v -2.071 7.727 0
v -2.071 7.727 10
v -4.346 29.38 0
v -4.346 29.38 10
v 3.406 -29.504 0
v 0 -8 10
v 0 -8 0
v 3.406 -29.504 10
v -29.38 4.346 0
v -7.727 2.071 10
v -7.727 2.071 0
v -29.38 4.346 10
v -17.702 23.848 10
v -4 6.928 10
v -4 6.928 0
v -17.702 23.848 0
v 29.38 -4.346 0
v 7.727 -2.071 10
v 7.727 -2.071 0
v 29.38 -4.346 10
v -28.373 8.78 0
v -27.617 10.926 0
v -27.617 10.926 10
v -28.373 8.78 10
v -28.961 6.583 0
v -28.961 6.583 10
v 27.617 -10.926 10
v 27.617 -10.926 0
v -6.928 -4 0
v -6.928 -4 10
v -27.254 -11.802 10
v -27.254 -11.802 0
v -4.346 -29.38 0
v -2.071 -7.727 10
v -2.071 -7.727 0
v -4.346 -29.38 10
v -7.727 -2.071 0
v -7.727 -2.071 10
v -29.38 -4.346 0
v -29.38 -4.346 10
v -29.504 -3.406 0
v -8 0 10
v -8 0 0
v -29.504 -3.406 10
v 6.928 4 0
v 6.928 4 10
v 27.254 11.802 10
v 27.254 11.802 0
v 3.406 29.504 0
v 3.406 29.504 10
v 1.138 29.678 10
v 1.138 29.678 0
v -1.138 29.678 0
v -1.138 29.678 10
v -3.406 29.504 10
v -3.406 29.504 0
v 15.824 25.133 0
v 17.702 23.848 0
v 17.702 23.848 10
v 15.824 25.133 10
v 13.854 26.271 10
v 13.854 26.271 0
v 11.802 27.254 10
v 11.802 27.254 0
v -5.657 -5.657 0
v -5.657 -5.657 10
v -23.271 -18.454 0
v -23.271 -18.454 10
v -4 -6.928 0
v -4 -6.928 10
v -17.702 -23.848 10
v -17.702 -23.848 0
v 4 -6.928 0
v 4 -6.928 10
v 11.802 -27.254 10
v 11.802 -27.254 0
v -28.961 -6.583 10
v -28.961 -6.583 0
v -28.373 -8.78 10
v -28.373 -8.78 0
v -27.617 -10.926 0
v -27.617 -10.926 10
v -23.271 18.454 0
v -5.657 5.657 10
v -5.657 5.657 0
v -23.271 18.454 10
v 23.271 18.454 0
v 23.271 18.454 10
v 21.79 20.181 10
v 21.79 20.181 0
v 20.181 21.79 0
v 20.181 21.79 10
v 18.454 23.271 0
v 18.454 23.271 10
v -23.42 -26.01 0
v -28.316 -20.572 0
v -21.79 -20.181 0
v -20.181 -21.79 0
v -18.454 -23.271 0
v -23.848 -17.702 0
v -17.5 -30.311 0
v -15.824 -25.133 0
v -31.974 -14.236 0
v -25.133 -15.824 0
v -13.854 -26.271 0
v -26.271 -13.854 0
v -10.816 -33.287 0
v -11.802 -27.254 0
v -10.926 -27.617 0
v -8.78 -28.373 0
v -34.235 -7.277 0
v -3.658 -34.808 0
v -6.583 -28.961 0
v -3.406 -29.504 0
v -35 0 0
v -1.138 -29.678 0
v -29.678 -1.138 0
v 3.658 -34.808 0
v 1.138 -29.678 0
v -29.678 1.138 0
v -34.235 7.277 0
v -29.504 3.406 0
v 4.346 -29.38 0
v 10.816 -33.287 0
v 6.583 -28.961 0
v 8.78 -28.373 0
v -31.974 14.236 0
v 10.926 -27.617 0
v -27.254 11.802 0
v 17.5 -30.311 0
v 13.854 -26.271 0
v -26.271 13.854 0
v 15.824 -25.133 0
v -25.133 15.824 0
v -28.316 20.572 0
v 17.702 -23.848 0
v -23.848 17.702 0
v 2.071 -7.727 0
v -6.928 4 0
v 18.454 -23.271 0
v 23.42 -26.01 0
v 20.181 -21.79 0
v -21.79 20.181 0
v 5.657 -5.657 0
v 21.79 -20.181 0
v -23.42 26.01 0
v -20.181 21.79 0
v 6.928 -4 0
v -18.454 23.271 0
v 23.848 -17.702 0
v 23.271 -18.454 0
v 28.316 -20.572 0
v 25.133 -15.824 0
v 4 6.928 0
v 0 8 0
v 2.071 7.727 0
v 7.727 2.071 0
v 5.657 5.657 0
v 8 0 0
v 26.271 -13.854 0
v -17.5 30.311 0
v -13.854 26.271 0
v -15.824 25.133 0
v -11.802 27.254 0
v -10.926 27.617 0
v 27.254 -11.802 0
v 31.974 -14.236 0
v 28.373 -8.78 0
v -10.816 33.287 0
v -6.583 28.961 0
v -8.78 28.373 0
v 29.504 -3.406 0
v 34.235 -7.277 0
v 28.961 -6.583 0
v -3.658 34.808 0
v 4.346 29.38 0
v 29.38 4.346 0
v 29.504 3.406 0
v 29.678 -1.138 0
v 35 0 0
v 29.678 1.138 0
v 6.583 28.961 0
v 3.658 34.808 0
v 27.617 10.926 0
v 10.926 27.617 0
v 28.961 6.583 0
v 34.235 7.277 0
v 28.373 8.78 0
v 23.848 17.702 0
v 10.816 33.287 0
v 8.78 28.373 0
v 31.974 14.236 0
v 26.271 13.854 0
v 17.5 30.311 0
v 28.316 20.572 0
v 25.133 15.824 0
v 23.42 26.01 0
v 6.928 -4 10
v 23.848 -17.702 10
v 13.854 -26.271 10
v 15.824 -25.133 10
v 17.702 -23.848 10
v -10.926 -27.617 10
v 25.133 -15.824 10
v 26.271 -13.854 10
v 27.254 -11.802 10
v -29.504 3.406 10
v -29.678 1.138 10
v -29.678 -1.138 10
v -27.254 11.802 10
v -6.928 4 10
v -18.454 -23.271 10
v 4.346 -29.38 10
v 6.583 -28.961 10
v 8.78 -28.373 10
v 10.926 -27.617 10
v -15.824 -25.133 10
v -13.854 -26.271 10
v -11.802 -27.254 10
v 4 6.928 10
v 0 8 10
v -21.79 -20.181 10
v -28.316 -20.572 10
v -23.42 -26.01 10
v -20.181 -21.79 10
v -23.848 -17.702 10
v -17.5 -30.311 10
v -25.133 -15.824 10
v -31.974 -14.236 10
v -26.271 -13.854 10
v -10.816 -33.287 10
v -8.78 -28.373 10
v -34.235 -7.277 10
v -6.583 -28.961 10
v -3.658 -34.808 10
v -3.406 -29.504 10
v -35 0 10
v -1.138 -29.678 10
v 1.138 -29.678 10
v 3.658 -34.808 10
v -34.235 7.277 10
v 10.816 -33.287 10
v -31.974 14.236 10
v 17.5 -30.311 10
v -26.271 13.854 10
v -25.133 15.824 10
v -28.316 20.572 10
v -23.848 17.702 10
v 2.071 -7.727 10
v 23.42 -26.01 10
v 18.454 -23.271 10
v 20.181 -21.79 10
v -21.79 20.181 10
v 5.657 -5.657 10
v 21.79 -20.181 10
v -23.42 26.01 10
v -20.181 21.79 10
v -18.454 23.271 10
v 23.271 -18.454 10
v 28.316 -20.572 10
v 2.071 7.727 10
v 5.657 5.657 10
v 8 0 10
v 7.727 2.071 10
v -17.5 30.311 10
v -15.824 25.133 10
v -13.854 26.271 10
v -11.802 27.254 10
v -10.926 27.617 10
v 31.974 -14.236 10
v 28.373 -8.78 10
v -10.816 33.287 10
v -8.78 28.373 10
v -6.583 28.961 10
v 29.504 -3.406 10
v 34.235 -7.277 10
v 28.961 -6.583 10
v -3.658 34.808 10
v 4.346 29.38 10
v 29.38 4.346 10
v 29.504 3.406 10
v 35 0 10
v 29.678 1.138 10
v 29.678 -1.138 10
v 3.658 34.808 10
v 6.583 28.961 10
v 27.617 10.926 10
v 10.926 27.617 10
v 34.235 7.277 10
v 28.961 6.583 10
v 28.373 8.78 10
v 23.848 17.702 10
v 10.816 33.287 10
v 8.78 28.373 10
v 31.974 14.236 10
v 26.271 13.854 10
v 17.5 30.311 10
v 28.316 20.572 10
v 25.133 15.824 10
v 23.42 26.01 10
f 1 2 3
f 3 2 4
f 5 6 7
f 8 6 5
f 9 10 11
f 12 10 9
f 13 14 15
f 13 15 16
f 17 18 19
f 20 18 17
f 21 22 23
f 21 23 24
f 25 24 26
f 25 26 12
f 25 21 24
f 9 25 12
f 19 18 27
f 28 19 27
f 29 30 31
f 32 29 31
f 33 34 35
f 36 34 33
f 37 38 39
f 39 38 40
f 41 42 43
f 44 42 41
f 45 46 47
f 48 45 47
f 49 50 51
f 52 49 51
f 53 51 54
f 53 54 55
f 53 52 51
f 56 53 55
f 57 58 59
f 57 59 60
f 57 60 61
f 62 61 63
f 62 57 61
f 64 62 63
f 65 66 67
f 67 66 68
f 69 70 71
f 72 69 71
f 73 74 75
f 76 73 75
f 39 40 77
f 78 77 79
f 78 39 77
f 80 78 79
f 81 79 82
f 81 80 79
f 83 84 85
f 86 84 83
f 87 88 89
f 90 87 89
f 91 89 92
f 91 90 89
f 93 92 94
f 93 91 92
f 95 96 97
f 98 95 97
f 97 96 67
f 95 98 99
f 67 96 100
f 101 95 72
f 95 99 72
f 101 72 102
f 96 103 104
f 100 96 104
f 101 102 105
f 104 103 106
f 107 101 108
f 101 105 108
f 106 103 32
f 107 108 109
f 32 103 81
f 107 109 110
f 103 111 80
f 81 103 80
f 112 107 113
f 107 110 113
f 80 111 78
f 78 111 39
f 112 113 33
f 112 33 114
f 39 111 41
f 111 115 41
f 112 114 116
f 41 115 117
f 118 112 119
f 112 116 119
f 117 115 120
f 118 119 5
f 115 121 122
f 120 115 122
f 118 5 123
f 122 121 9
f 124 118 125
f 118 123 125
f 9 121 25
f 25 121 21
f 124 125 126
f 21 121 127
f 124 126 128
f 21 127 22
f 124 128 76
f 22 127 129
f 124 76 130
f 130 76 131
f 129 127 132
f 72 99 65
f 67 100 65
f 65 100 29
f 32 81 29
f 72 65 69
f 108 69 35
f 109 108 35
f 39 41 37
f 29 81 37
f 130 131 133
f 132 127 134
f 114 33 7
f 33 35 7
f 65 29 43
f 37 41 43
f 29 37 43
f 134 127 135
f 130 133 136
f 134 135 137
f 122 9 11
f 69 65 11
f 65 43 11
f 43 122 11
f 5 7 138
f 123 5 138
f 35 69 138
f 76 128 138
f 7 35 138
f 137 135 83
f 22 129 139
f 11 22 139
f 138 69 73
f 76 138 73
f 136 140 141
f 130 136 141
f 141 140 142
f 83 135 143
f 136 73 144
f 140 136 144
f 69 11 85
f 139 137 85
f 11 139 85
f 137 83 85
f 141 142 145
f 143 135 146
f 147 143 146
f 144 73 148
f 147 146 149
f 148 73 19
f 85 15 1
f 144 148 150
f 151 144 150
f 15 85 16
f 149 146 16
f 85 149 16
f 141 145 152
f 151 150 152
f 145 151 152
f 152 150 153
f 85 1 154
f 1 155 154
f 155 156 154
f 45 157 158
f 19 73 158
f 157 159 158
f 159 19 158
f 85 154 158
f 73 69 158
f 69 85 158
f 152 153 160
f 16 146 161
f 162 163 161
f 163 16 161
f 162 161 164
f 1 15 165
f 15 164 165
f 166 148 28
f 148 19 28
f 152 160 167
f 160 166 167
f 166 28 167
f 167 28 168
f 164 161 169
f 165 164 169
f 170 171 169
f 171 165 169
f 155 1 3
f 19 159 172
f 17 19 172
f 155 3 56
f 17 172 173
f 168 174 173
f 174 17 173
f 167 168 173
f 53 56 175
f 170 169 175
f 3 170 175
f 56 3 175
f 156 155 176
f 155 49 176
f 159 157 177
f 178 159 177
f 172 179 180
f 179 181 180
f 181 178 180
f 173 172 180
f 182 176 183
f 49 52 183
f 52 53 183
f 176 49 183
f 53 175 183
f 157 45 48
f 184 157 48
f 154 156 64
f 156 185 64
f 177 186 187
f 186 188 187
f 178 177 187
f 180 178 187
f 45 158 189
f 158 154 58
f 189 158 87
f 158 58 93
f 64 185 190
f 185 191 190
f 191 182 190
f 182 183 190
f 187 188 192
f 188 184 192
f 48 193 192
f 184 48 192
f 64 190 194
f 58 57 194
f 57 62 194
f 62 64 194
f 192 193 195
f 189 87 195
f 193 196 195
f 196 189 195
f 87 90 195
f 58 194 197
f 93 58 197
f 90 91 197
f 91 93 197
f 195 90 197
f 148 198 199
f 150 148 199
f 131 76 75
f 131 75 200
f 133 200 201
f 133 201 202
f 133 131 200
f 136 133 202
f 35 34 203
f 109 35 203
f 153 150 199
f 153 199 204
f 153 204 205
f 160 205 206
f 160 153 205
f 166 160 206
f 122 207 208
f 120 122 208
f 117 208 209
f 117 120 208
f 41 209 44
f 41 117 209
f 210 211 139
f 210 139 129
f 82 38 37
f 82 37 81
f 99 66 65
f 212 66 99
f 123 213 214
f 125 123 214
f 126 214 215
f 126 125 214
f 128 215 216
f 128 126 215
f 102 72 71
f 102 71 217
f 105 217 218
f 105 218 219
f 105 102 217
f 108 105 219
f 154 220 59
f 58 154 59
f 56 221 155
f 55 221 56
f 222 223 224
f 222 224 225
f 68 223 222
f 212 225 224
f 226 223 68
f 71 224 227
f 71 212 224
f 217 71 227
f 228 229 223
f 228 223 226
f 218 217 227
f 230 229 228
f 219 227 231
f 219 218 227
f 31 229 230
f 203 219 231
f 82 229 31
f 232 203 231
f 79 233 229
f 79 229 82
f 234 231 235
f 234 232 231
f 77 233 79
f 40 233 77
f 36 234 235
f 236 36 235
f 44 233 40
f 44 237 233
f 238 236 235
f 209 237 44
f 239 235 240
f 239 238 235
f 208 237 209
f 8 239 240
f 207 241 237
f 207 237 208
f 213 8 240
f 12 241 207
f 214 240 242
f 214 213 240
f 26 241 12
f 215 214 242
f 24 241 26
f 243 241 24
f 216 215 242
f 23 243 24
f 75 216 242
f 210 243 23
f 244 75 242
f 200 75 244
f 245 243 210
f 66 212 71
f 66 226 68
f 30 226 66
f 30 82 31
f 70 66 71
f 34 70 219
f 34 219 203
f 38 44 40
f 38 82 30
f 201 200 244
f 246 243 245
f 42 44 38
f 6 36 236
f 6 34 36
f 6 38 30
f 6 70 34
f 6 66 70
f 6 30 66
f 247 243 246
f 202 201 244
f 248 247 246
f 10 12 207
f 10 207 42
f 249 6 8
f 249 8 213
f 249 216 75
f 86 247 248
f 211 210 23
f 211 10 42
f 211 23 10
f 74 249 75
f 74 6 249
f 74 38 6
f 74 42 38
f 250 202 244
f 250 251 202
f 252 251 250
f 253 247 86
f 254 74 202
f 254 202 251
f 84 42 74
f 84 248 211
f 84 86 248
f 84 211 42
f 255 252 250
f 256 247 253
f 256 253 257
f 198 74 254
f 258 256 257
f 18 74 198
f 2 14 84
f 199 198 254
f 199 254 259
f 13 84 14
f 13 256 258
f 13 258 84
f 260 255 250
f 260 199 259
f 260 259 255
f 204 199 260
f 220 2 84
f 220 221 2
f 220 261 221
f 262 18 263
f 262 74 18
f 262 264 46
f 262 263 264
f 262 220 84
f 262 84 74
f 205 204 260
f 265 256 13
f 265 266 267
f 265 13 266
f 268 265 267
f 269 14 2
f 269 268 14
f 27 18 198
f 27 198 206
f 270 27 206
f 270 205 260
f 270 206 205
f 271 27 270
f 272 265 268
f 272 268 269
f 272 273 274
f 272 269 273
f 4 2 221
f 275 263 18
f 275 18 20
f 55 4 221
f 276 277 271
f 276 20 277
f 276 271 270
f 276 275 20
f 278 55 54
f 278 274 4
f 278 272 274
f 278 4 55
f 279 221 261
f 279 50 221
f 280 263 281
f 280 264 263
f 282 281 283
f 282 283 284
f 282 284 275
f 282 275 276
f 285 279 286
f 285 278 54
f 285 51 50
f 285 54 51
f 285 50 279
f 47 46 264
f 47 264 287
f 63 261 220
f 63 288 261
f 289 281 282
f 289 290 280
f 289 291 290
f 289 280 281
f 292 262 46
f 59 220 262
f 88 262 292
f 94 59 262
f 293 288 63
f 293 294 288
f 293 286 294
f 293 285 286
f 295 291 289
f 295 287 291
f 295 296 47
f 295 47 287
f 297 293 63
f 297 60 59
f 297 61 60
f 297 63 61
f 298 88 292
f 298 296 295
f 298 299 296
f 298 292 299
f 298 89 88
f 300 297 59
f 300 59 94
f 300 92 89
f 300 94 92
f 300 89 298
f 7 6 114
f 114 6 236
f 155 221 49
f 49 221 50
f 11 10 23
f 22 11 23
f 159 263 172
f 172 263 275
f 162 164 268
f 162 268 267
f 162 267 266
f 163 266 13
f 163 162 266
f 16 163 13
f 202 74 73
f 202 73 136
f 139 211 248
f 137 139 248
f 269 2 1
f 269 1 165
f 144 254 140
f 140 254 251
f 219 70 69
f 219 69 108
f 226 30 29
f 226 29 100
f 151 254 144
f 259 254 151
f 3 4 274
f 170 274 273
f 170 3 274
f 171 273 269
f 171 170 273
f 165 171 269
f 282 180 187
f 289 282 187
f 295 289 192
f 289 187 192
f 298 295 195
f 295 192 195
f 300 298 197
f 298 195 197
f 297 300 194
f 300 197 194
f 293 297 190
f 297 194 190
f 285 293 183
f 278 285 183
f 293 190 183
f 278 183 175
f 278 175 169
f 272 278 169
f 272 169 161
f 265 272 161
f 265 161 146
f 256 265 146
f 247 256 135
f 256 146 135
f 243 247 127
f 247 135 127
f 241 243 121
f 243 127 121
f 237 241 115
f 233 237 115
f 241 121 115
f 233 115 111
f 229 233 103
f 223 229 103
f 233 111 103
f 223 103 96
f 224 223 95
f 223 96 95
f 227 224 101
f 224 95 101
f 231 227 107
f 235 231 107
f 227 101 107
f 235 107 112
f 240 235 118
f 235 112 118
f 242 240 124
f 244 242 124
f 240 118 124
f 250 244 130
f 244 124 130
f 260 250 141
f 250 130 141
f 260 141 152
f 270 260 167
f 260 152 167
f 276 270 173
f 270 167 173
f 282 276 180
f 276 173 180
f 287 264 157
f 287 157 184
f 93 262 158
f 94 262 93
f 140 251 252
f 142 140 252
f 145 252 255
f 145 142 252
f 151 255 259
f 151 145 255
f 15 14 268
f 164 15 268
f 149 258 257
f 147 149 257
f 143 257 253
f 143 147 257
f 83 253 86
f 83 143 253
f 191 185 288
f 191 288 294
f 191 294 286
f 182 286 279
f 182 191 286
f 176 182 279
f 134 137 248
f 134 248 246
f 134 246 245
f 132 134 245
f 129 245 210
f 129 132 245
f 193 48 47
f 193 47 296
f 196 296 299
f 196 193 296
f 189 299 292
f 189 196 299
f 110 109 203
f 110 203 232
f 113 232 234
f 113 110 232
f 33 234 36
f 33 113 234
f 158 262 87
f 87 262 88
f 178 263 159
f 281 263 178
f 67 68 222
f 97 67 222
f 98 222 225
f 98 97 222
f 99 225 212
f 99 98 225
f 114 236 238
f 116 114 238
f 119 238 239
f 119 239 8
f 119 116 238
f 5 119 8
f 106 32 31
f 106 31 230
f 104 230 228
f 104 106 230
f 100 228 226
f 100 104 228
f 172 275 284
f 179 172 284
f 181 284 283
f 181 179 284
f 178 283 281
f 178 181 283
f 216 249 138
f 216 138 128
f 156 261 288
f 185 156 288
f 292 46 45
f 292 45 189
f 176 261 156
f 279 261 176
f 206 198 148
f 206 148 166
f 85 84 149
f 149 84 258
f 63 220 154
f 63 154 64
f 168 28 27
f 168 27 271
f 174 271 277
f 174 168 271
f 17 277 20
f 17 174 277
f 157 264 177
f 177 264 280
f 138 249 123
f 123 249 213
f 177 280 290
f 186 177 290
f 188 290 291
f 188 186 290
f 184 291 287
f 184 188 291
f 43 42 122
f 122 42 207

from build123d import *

# Parameters (mm, degrees)
CYLINDER003_R               = 29.7
CYLINDER003_DEPTH           = 10
CYLINDER002_R               = 35
CYLINDER002_DEPTH           = 10
CYLINDER001_W               = 22
CYLINDER001_H               = 10
CYLINDER001_ANGLE           = 18
CYLINDER001_PLACEMENT_ANGLE = -9
ARRAY_COUNT                 = 24
CYLINDER_R                  = 29.7
CYLINDER_DEPTH              = 10


with BuildPart() as borde_interno_llanta:
    # Cylinder003 → Cylinder003 (new body)
    with BuildSketch(Plane.XY):
        Circle(CYLINDER003_R)
    extrude(amount=CYLINDER003_DEPTH)


with BuildPart() as llanta:
    # Cylinder002 → Cylinder002 (new body)
    with BuildSketch(Plane.XY):
        Circle(CYLINDER002_R)
    extrude(amount=CYLINDER002_DEPTH)

    # Cut001: cut Borde Interno Llanta
    add(borde_interno_llanta.part, mode=Mode.SUBTRACT)


with BuildPart() as array:
    # Cylinder001 → Cylinder001 (revolve)
    with BuildSketch(Plane.XZ):
        with Locations((11, 5)):
            Rectangle(CYLINDER001_W, CYLINDER001_H)
    revolve(axis=Axis((0, 0, 0), (0, 0, 1)), revolution_arc=CYLINDER001_ANGLE)


with BuildPart() as array_1:
    # Cylinder001 placement: moved
    add(array.part.moved(Location((8, 0, 0))).rotate(Axis((8, 0, 0), (0, 0, 1)), CYLINDER001_PLACEMENT_ANGLE))

    # Array: Array ×24 about axis
    array_axis = Axis((0, 0, 0), (0, 0, 1))


with BuildPart() as array_2:
    add(array_1.part)
    for i in range(1, ARRAY_COUNT):
        add(array_1.part.rotate(array_axis, i * 360 / ARRAY_COUNT))


with BuildPart() as rueda_con_radios:
    # Cylinder → Cylinder (new body)
    with BuildSketch(Plane.XY):
        Circle(CYLINDER_R)
    extrude(amount=CYLINDER_DEPTH)

    # Cut: cut Array
    add(array_2.part, mode=Mode.SUBTRACT)

    # Fusion: union Llanta
    add(llanta.part)


solid = rueda_con_radios.part
